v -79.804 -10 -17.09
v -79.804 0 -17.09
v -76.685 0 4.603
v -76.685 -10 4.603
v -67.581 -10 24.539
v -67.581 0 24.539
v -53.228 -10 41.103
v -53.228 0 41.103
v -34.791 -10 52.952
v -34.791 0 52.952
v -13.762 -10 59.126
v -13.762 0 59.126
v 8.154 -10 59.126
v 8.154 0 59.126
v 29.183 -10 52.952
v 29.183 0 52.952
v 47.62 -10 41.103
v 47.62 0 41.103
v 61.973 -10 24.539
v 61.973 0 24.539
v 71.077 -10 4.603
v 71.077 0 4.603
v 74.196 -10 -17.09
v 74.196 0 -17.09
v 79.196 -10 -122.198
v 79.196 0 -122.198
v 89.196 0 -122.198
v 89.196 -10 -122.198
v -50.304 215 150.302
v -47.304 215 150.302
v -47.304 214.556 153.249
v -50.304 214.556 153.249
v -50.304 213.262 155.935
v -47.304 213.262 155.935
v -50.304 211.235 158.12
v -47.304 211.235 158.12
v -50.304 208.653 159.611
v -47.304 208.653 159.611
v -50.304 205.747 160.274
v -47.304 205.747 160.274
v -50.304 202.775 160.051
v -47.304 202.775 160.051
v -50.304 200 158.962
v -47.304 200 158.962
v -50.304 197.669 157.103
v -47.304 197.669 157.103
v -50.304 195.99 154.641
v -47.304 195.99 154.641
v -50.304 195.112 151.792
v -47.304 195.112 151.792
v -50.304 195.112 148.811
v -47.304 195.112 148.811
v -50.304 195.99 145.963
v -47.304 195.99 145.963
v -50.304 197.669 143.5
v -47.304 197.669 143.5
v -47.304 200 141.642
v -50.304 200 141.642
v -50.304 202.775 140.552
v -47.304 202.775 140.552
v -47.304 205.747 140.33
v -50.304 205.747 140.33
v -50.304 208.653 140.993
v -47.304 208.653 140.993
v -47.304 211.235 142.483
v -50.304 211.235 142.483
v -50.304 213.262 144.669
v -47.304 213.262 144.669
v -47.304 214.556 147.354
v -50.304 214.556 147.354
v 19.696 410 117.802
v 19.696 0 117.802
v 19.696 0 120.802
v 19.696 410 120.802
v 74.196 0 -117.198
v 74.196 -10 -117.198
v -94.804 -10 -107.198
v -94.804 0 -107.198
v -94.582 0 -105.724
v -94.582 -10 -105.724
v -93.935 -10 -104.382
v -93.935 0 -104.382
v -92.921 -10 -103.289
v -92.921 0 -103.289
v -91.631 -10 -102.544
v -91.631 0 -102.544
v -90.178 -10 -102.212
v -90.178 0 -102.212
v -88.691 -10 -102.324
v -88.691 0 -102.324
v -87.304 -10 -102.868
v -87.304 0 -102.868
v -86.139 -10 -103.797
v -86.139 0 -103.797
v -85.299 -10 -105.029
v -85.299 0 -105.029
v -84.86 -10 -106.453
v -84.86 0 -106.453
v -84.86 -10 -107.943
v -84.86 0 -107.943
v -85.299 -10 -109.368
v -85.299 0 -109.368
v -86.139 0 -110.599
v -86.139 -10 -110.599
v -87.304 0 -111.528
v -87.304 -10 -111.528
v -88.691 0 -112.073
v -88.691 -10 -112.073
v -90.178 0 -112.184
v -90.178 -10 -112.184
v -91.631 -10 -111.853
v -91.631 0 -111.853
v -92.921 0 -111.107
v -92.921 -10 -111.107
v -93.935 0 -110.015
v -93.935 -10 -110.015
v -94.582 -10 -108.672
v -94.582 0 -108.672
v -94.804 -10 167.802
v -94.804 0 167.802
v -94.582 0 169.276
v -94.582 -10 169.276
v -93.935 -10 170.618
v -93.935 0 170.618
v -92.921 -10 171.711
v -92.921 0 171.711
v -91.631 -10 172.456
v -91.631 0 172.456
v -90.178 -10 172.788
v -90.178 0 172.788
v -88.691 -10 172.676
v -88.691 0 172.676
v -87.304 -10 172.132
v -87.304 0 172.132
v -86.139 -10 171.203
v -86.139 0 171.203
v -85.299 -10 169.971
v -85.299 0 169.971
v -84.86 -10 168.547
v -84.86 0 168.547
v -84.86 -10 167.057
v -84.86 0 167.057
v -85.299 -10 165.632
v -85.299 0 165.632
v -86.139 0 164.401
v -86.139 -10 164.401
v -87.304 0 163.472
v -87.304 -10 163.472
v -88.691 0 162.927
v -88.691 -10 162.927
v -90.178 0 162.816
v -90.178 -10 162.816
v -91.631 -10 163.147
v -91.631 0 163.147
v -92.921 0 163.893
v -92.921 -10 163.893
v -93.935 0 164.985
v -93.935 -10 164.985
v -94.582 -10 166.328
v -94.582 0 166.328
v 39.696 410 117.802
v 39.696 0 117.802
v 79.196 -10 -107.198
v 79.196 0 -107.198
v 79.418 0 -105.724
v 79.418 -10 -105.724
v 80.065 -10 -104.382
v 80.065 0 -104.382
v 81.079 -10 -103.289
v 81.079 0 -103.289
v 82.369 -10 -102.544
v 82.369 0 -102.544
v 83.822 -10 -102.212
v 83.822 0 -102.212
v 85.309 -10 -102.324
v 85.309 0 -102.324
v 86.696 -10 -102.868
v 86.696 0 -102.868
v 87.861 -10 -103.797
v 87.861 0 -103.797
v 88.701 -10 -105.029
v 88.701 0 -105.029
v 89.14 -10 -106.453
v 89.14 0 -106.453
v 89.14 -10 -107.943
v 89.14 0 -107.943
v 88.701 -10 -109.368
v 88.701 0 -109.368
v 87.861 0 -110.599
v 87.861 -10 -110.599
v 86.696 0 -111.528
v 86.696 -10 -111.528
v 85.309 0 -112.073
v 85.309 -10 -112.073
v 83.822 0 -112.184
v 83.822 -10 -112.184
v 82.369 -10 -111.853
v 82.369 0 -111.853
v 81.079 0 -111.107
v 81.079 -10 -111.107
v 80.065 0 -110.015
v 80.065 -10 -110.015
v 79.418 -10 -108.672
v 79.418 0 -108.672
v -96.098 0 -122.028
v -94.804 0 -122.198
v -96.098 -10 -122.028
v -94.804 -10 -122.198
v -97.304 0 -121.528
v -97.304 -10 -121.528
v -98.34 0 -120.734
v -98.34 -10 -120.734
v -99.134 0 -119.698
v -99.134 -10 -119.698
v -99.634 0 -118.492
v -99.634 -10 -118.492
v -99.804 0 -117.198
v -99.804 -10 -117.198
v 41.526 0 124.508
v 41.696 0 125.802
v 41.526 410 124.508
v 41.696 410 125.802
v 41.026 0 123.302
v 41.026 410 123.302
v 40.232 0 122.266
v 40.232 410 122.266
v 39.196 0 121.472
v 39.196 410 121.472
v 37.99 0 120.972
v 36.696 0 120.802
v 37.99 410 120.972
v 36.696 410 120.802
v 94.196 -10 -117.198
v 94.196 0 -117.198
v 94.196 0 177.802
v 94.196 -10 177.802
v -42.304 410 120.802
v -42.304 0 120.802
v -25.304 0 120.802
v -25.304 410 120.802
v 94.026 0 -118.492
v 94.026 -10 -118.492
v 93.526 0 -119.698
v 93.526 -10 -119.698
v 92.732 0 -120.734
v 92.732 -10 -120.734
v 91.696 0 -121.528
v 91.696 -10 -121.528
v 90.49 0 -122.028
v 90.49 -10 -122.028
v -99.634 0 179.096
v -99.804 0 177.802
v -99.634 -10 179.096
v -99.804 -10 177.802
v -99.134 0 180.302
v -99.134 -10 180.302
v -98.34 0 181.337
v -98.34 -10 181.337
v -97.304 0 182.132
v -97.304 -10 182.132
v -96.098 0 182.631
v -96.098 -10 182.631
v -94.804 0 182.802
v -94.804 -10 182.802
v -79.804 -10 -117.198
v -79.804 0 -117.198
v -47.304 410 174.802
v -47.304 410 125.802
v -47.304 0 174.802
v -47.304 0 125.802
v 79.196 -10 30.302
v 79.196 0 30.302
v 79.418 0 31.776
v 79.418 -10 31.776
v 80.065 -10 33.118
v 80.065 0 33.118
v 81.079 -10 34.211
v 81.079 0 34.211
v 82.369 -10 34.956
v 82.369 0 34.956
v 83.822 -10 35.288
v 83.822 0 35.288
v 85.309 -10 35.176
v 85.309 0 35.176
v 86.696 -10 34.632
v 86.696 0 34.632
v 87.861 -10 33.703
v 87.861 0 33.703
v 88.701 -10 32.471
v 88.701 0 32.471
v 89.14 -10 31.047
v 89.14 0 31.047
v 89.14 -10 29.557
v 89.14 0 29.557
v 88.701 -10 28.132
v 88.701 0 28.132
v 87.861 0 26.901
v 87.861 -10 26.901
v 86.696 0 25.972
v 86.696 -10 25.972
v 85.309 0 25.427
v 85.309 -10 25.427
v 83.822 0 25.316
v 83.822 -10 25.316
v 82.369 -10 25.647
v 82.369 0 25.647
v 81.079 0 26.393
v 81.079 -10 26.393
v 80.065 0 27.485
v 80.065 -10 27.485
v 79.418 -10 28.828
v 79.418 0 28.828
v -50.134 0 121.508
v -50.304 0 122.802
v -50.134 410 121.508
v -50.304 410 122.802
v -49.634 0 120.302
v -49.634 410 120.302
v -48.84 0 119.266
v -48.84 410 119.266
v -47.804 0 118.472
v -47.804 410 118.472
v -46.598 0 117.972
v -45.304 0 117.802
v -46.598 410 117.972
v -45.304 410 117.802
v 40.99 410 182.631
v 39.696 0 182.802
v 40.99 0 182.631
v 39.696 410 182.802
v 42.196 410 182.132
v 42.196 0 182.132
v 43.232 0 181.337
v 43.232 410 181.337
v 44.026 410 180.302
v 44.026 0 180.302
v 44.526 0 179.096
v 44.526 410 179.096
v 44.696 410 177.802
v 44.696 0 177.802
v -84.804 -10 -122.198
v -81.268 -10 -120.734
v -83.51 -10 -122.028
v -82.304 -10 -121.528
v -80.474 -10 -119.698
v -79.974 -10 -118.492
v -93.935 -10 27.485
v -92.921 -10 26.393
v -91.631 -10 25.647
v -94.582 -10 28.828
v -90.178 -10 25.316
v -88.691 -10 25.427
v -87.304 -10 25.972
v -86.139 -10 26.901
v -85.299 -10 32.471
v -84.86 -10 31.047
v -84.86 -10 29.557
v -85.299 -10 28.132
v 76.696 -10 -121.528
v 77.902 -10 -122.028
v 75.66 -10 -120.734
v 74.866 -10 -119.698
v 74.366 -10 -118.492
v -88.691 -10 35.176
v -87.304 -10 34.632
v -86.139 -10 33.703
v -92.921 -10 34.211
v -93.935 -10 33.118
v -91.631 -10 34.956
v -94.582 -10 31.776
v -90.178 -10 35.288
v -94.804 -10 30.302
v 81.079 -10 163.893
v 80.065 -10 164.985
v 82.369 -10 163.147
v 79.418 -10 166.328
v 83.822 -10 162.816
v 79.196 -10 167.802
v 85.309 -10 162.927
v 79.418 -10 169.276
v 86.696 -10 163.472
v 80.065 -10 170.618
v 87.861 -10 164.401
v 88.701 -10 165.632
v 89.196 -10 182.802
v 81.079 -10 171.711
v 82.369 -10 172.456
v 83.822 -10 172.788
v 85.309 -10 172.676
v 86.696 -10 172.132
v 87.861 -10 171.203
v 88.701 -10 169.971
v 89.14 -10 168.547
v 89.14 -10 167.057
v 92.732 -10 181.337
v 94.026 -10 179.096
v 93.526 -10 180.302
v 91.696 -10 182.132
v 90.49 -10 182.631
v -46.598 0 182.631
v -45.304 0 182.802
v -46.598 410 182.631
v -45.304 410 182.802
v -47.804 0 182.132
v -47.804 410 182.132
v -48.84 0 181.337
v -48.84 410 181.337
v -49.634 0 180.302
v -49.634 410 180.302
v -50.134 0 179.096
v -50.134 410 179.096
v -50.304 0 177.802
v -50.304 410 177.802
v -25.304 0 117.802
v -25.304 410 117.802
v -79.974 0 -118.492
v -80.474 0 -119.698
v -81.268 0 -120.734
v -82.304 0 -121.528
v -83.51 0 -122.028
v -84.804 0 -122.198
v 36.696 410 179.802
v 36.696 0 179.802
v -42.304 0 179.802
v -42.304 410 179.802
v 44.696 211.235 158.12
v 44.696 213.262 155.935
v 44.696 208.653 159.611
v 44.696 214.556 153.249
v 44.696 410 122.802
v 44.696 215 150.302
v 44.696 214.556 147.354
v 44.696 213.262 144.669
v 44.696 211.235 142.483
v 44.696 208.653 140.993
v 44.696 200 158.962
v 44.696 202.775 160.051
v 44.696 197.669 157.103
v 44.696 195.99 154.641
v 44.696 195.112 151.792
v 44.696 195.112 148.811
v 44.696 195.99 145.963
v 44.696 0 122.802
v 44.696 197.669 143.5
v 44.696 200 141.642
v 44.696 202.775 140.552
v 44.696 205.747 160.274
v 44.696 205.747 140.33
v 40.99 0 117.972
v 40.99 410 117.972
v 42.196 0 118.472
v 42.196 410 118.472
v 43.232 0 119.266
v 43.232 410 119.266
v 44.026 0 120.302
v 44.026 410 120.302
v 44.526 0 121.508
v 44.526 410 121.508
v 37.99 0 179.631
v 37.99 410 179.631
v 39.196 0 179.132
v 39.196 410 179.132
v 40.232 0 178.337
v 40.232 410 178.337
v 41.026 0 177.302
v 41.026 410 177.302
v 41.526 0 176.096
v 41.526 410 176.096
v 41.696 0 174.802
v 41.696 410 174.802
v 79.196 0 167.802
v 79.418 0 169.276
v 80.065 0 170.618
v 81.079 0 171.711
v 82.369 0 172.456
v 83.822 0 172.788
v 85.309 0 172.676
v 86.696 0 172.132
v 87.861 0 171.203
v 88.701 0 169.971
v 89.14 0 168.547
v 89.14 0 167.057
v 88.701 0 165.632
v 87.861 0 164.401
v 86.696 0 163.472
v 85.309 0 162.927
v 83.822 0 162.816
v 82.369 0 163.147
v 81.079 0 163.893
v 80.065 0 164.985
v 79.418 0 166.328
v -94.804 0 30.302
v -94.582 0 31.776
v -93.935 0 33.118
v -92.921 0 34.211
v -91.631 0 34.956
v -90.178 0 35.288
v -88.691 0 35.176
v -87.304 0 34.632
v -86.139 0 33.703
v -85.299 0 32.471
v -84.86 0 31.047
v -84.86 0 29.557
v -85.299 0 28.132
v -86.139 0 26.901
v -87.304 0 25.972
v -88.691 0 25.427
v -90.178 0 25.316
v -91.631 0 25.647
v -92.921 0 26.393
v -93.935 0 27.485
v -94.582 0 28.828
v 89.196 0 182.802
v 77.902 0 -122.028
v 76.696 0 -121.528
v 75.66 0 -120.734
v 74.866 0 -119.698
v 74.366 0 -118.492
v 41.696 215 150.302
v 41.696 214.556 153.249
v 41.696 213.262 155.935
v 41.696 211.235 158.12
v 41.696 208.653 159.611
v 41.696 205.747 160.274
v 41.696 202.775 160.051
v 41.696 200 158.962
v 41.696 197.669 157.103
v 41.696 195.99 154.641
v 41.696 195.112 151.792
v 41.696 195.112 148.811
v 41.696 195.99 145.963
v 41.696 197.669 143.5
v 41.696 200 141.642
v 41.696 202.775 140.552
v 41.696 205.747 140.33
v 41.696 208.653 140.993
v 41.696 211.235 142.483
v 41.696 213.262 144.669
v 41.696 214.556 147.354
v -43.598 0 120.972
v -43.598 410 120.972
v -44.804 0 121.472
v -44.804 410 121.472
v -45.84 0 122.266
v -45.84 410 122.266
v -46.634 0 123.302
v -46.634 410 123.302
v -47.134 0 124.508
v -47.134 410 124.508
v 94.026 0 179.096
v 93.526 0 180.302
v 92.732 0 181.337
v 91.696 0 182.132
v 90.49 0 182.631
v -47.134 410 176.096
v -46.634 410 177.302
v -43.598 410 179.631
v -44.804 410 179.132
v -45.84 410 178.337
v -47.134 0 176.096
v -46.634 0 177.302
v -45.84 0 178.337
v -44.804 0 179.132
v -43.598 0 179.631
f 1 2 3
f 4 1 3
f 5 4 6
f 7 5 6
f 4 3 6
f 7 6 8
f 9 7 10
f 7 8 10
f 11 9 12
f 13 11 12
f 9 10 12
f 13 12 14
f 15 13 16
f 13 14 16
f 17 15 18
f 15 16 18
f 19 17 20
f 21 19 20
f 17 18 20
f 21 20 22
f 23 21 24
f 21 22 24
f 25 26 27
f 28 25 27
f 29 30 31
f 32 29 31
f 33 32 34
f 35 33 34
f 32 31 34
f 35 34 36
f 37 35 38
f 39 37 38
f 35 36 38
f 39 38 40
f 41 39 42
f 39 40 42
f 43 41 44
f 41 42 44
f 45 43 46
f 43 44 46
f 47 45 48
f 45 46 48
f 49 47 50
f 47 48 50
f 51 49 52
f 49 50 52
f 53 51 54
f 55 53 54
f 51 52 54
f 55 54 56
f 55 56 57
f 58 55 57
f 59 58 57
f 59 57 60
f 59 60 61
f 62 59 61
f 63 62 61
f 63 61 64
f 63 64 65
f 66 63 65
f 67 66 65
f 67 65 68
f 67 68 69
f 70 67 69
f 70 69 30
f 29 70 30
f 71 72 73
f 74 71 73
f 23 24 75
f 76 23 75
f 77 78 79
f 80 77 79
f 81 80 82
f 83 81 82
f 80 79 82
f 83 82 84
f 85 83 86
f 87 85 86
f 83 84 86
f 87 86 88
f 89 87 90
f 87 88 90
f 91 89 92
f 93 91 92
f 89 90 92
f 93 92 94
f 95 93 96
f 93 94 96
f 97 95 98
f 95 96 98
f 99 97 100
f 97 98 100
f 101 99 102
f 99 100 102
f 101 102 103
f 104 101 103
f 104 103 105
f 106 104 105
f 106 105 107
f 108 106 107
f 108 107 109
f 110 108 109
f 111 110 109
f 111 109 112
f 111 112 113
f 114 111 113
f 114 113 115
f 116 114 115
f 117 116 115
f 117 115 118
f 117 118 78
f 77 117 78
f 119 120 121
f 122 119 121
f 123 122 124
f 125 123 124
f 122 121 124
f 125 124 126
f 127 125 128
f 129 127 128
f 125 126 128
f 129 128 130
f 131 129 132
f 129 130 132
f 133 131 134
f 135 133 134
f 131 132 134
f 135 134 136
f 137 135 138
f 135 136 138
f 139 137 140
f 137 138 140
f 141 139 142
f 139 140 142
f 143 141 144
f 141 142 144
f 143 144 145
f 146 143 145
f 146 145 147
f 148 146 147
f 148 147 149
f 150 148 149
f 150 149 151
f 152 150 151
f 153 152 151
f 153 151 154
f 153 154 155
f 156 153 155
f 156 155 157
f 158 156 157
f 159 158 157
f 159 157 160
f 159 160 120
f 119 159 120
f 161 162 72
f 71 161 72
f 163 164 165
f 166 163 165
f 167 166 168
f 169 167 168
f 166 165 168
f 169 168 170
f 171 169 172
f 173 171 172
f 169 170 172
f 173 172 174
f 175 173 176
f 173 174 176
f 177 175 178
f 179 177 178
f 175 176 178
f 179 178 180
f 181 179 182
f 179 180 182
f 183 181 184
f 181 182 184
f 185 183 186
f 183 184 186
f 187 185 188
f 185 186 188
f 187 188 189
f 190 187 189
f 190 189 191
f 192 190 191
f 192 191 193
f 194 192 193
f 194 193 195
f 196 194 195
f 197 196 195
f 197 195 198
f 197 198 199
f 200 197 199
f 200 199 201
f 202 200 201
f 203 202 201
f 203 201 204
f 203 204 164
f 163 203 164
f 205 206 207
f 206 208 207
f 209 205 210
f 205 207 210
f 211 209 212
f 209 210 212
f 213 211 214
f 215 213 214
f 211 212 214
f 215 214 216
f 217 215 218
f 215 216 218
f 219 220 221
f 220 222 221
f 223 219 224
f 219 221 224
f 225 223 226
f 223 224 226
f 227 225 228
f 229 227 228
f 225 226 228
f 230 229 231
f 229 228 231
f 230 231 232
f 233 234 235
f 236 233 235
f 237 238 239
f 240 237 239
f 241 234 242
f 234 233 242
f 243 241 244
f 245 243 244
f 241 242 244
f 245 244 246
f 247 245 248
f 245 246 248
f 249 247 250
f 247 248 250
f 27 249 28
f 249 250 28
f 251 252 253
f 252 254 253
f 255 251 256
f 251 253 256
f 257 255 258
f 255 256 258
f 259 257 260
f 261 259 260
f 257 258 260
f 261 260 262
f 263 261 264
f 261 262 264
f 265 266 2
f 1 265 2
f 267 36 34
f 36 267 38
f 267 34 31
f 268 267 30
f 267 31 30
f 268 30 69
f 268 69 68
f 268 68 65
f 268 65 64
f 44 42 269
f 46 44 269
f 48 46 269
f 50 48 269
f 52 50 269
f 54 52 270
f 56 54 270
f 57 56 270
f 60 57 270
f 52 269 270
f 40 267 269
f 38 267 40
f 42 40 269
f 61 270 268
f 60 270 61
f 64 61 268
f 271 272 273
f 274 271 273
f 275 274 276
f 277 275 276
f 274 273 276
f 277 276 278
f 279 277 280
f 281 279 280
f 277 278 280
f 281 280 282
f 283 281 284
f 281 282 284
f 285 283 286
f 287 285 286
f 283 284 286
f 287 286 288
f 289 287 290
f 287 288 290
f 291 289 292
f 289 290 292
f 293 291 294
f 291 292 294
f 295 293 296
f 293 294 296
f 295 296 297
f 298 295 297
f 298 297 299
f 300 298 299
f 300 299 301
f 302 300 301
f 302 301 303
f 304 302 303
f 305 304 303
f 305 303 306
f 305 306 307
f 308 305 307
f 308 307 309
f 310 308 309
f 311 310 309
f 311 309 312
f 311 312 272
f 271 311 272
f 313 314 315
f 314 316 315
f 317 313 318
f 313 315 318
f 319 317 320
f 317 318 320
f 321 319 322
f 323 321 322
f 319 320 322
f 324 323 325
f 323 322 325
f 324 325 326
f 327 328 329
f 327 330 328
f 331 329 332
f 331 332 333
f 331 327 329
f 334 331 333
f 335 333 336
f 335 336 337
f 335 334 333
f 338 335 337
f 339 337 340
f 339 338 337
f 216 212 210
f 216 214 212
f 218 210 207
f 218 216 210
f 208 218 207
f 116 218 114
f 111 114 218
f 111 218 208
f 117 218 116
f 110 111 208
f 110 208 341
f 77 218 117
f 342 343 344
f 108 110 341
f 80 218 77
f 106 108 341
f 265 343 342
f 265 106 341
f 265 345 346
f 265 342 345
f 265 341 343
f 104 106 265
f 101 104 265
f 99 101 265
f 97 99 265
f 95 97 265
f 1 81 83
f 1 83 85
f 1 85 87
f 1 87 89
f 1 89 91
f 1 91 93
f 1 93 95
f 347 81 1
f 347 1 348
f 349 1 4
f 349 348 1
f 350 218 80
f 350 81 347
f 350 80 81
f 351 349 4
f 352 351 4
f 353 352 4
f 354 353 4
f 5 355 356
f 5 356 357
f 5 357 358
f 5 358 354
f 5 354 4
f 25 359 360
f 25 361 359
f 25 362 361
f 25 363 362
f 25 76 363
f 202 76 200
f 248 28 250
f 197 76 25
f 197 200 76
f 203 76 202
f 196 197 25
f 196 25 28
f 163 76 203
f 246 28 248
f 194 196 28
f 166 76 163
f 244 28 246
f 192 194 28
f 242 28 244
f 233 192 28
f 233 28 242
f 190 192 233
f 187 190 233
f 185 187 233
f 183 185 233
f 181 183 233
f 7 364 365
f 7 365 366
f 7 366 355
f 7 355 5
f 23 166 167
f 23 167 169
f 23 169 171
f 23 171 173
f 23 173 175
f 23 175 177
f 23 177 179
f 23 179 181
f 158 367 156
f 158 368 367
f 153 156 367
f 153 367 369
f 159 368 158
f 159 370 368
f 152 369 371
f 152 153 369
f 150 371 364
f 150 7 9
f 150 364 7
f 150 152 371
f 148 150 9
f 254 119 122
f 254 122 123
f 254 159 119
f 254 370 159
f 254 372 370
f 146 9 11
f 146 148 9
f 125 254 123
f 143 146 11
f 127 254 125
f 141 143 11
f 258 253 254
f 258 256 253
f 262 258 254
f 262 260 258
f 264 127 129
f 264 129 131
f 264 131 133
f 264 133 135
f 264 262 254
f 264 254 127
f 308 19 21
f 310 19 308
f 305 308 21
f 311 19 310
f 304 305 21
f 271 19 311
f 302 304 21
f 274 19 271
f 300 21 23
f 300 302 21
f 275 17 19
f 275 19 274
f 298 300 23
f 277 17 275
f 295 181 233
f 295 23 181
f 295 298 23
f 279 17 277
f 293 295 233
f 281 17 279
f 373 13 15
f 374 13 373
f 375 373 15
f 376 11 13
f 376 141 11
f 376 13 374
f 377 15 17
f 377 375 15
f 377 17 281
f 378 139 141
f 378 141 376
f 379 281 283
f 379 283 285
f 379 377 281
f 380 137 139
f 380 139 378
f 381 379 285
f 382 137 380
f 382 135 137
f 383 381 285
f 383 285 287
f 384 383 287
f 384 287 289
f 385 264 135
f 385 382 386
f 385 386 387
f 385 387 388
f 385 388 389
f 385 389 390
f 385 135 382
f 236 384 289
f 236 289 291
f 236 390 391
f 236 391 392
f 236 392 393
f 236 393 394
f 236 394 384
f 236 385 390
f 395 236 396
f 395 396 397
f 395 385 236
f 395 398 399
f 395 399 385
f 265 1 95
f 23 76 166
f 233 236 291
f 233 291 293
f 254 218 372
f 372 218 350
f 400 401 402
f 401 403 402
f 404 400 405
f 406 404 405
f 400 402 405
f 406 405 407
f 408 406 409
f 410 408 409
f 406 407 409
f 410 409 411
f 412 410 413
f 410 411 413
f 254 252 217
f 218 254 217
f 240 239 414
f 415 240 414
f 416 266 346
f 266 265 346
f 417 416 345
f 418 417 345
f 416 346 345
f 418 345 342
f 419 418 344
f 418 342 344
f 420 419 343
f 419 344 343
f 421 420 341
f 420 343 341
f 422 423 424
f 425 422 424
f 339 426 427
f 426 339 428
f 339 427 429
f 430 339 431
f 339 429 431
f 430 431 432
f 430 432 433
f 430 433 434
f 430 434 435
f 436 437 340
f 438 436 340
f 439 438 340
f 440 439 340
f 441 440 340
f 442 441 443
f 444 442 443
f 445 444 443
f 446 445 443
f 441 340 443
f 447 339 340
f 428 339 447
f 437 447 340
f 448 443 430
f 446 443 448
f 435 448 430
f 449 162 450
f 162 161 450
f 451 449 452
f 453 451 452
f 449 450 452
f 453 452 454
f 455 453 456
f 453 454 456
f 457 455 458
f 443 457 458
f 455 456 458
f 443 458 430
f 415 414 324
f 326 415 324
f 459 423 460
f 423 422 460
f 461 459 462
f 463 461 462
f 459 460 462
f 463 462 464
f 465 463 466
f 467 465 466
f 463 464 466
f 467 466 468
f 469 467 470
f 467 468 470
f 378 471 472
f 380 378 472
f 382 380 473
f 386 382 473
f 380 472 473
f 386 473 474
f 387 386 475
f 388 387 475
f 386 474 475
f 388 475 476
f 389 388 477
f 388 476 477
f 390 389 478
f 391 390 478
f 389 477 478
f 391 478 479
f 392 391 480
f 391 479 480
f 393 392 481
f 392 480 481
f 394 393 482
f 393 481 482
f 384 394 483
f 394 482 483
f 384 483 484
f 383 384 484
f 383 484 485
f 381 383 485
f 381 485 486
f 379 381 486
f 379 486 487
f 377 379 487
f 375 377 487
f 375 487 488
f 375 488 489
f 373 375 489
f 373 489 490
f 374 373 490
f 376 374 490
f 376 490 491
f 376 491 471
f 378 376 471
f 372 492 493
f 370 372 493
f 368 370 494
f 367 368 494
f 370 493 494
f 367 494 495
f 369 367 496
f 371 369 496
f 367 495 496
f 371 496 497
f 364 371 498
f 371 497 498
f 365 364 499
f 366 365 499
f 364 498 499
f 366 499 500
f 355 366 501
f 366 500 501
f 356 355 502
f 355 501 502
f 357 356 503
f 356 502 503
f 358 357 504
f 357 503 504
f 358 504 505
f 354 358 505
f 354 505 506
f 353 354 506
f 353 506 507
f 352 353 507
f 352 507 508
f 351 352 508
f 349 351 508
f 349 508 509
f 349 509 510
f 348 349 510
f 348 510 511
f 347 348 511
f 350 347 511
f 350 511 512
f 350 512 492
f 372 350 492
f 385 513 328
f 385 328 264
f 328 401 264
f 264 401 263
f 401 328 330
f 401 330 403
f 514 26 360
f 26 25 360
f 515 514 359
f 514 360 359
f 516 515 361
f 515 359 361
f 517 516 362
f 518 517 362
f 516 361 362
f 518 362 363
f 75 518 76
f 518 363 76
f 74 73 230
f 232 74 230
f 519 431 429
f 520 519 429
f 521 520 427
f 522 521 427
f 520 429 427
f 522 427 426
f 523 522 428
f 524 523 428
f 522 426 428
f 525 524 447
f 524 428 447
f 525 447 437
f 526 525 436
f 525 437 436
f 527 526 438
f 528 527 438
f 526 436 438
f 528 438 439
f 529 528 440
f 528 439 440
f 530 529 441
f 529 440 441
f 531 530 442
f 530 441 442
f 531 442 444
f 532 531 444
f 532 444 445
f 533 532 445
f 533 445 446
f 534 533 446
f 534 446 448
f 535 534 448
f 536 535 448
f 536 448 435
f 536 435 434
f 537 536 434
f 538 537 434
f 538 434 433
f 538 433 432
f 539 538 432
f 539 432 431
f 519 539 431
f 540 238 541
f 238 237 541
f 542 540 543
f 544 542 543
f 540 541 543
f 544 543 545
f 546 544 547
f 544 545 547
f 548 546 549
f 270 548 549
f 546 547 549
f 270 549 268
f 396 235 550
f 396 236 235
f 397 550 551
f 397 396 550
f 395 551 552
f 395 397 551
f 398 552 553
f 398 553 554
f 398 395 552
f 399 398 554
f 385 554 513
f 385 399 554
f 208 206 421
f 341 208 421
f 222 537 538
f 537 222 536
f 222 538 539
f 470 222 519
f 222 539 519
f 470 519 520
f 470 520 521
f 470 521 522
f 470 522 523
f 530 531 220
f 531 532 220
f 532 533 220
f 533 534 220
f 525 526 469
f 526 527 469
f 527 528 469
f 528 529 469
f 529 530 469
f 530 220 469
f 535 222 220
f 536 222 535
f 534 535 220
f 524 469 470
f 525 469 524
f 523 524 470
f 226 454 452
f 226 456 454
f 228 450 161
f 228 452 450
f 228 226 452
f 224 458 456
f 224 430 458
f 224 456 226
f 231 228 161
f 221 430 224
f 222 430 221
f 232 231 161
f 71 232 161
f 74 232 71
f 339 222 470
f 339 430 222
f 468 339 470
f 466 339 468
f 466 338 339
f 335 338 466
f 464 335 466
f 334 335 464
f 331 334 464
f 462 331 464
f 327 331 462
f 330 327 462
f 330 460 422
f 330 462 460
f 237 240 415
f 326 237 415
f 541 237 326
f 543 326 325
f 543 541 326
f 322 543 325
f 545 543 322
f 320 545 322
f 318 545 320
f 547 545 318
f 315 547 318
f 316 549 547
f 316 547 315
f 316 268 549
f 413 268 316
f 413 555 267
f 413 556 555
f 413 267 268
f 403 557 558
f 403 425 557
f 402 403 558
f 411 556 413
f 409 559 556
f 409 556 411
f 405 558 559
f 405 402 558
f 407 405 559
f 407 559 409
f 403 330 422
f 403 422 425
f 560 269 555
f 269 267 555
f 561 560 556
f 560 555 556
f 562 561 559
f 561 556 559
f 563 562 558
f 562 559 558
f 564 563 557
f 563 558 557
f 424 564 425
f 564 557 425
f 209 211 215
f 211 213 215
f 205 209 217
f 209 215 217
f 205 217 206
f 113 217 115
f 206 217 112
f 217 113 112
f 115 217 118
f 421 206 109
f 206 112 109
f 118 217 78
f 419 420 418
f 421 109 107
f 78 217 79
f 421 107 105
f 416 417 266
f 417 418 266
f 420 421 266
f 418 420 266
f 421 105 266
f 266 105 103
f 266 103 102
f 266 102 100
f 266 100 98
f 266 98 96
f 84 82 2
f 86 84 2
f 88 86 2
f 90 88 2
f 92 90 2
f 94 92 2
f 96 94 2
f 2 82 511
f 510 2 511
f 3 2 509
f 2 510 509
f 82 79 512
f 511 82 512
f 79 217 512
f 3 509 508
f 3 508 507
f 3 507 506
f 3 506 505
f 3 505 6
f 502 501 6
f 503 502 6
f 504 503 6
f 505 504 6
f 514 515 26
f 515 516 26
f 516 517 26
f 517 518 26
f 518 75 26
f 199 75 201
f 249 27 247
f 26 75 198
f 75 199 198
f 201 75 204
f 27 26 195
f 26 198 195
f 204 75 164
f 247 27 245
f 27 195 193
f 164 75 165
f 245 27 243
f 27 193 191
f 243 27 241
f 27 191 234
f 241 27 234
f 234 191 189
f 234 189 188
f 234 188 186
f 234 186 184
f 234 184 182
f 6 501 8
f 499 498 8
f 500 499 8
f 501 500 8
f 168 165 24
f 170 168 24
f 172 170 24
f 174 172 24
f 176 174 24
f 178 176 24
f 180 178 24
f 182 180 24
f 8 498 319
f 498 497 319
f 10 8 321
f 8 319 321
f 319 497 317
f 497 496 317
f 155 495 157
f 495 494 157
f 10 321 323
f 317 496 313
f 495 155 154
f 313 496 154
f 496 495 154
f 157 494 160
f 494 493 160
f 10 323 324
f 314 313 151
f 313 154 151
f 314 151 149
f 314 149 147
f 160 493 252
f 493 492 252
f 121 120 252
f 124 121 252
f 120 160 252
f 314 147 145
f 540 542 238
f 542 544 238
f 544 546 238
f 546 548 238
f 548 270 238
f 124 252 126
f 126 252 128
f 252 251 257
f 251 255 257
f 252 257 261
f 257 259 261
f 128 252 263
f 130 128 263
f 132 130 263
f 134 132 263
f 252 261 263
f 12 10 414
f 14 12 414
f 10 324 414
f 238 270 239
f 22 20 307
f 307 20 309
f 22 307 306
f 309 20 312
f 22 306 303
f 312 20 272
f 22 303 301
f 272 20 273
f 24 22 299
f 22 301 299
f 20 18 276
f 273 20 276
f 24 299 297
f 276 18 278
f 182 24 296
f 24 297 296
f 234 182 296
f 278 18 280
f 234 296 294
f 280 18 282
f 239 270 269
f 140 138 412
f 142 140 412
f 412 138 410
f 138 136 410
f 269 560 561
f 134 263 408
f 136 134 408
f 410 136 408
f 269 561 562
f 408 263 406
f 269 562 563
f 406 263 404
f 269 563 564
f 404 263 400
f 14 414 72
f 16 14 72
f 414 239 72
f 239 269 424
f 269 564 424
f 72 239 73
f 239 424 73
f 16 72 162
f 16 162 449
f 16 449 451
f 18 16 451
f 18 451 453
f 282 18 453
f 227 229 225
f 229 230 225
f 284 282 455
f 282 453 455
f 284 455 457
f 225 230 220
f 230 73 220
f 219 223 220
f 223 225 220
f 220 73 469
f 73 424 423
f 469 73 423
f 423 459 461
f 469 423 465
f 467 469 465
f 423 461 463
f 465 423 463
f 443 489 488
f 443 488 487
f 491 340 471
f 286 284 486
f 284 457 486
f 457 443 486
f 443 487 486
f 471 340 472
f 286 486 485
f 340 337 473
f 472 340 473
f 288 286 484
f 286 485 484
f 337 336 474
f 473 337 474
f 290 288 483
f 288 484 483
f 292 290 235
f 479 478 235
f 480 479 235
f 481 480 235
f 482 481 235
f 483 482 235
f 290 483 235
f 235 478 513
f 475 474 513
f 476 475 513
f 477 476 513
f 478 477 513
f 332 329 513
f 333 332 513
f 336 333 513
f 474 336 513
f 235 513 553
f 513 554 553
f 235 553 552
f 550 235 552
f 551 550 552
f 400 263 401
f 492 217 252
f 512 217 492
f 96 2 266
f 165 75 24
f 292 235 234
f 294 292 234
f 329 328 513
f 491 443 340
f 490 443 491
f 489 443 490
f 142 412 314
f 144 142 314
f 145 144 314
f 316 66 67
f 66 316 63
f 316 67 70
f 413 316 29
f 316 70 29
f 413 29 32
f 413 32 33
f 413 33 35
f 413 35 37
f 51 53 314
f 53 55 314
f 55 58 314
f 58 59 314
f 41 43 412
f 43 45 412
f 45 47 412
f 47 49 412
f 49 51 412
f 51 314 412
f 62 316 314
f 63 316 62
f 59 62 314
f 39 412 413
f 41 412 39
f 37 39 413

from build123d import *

# Parameters (mm, degrees)
F1_DEPTH = 10
F3_DEPTH = 410
F4_R     = 5
F5_R     = 5
F6_R     = 5
F7_DEPTH = 10.001
F8_R     = 10
F9_DEPTH = 144.501


with BuildPart() as f1:
    # F0 (on Front) → F1 (new body)
    with BuildSketch(Plane.XZ):
        with BuildLine():
            Line((-79.8040040345, -122.1982348855), (-79.8040040345, -17.0901585641))
            ThreePointArc((-79.8040040345, -17.0901585641), (-2.8040040345, 59.9098414359), (74.1959959655, -17.0901585641))
            Line((74.1959959655, -17.0901585641), (74.1959959655, -122.1982348855))
            Line((74.1959959655, -122.1982348855), (94.1959959655, -122.1982348855))
            Line((94.1959959655, -122.1982348855), (94.1959959655, 182.8017651145))
            Line((94.1959959655, 182.8017651145), (-99.8040040345, 182.8017651145))
            Line((-99.8040040345, 182.8017651145), (-99.8040040345, -122.1982348855))
            Line((-99.8040040345, -122.1982348855), (-79.8040040345, -122.1982348855))
        make_face()
    extrude(amount=F1_DEPTH)

    # F2 (on face) → F3 (join)
    with BuildSketch(Plane(origin=(0, 0, 0), x_dir=(-1, 0, 0), z_dir=(0, 1, 0))):
        Polygon((50.3040040345, 117.8017651145), (50.3040040345, 182.8017651145), (-44.6959959655, 182.8017651145), (-44.6959959655, 117.8017651145), (-19.6959959655, 117.8017651145), (-19.6959959655, 120.8017651145), (-41.6959959655, 120.8017651145), (-41.6959959655, 179.8017651145), (47.3040040345, 179.8017651145), (47.3040040345, 120.8017651145), (25.3040040345, 120.8017651145), (25.3040040345, 117.8017651145), align=None)
    extrude(amount=F3_DEPTH)

    # F4
    f4_edges = [f1.edges().sort_by_distance(p)[0] for p in [
        (44.695996, 205, 182.801765),
        (-50.304004, 205, 182.801765),
        (-50.304004, 205, 117.801765),
        (44.695996, 205, 117.801765),
        (-47.304004, 205, 179.801765),
        (-47.304004, 205, 120.801765),
        (41.695996, 205, 120.801765),
        (41.695996, 205, 179.801765),
    ]]
    fillet(f4_edges, radius=F4_R)

    # F5
    f5_edges = [f1.edges().sort_by_distance(p)[0] for p in [
        (-99.804004, -5, -122.198235),
        (-99.804004, -5, 182.801765),
        (94.195996, -5, 182.801765),
        (94.195996, -5, -122.198235),
        (74.195996, -5, -122.198235),
        (-79.804004, -5, -122.198235),
    ]]
    fillet(f5_edges, radius=F5_R)

    # F6 (on face) → F7 (cut, through all)
    with BuildSketch(Plane(origin=(0, 0, 0), x_dir=(-1, 0, 0), z_dir=(0, 1, 0))):
        with Locations((-84.1959959655, 167.8017651145)):
            Circle(F6_R)
        with Locations((-84.1959959655, 30.3017651145)):
            Circle(F6_R)
        with Locations((-84.1959959655, -107.1982348855)):
            Circle(F6_R)
        with Locations((89.8040040345, 167.8017651145)):
            Circle(F6_R)
        with Locations((89.8040040345, 30.3017651145)):
            Circle(F6_R)
        with Locations((89.8040040345, -107.1982348855)):
            Circle(F6_R)
    extrude(amount=-F7_DEPTH, mode=Mode.SUBTRACT)

    # F8 (on face) → F9 (cut, through all)
    with BuildSketch(Plane.YZ.offset(44.6959959655)):
        with Locations((205, 150.3017651145)):
            Circle(F8_R)
    extrude(amount=-F9_DEPTH, mode=Mode.SUBTRACT)


solid = f1.part
